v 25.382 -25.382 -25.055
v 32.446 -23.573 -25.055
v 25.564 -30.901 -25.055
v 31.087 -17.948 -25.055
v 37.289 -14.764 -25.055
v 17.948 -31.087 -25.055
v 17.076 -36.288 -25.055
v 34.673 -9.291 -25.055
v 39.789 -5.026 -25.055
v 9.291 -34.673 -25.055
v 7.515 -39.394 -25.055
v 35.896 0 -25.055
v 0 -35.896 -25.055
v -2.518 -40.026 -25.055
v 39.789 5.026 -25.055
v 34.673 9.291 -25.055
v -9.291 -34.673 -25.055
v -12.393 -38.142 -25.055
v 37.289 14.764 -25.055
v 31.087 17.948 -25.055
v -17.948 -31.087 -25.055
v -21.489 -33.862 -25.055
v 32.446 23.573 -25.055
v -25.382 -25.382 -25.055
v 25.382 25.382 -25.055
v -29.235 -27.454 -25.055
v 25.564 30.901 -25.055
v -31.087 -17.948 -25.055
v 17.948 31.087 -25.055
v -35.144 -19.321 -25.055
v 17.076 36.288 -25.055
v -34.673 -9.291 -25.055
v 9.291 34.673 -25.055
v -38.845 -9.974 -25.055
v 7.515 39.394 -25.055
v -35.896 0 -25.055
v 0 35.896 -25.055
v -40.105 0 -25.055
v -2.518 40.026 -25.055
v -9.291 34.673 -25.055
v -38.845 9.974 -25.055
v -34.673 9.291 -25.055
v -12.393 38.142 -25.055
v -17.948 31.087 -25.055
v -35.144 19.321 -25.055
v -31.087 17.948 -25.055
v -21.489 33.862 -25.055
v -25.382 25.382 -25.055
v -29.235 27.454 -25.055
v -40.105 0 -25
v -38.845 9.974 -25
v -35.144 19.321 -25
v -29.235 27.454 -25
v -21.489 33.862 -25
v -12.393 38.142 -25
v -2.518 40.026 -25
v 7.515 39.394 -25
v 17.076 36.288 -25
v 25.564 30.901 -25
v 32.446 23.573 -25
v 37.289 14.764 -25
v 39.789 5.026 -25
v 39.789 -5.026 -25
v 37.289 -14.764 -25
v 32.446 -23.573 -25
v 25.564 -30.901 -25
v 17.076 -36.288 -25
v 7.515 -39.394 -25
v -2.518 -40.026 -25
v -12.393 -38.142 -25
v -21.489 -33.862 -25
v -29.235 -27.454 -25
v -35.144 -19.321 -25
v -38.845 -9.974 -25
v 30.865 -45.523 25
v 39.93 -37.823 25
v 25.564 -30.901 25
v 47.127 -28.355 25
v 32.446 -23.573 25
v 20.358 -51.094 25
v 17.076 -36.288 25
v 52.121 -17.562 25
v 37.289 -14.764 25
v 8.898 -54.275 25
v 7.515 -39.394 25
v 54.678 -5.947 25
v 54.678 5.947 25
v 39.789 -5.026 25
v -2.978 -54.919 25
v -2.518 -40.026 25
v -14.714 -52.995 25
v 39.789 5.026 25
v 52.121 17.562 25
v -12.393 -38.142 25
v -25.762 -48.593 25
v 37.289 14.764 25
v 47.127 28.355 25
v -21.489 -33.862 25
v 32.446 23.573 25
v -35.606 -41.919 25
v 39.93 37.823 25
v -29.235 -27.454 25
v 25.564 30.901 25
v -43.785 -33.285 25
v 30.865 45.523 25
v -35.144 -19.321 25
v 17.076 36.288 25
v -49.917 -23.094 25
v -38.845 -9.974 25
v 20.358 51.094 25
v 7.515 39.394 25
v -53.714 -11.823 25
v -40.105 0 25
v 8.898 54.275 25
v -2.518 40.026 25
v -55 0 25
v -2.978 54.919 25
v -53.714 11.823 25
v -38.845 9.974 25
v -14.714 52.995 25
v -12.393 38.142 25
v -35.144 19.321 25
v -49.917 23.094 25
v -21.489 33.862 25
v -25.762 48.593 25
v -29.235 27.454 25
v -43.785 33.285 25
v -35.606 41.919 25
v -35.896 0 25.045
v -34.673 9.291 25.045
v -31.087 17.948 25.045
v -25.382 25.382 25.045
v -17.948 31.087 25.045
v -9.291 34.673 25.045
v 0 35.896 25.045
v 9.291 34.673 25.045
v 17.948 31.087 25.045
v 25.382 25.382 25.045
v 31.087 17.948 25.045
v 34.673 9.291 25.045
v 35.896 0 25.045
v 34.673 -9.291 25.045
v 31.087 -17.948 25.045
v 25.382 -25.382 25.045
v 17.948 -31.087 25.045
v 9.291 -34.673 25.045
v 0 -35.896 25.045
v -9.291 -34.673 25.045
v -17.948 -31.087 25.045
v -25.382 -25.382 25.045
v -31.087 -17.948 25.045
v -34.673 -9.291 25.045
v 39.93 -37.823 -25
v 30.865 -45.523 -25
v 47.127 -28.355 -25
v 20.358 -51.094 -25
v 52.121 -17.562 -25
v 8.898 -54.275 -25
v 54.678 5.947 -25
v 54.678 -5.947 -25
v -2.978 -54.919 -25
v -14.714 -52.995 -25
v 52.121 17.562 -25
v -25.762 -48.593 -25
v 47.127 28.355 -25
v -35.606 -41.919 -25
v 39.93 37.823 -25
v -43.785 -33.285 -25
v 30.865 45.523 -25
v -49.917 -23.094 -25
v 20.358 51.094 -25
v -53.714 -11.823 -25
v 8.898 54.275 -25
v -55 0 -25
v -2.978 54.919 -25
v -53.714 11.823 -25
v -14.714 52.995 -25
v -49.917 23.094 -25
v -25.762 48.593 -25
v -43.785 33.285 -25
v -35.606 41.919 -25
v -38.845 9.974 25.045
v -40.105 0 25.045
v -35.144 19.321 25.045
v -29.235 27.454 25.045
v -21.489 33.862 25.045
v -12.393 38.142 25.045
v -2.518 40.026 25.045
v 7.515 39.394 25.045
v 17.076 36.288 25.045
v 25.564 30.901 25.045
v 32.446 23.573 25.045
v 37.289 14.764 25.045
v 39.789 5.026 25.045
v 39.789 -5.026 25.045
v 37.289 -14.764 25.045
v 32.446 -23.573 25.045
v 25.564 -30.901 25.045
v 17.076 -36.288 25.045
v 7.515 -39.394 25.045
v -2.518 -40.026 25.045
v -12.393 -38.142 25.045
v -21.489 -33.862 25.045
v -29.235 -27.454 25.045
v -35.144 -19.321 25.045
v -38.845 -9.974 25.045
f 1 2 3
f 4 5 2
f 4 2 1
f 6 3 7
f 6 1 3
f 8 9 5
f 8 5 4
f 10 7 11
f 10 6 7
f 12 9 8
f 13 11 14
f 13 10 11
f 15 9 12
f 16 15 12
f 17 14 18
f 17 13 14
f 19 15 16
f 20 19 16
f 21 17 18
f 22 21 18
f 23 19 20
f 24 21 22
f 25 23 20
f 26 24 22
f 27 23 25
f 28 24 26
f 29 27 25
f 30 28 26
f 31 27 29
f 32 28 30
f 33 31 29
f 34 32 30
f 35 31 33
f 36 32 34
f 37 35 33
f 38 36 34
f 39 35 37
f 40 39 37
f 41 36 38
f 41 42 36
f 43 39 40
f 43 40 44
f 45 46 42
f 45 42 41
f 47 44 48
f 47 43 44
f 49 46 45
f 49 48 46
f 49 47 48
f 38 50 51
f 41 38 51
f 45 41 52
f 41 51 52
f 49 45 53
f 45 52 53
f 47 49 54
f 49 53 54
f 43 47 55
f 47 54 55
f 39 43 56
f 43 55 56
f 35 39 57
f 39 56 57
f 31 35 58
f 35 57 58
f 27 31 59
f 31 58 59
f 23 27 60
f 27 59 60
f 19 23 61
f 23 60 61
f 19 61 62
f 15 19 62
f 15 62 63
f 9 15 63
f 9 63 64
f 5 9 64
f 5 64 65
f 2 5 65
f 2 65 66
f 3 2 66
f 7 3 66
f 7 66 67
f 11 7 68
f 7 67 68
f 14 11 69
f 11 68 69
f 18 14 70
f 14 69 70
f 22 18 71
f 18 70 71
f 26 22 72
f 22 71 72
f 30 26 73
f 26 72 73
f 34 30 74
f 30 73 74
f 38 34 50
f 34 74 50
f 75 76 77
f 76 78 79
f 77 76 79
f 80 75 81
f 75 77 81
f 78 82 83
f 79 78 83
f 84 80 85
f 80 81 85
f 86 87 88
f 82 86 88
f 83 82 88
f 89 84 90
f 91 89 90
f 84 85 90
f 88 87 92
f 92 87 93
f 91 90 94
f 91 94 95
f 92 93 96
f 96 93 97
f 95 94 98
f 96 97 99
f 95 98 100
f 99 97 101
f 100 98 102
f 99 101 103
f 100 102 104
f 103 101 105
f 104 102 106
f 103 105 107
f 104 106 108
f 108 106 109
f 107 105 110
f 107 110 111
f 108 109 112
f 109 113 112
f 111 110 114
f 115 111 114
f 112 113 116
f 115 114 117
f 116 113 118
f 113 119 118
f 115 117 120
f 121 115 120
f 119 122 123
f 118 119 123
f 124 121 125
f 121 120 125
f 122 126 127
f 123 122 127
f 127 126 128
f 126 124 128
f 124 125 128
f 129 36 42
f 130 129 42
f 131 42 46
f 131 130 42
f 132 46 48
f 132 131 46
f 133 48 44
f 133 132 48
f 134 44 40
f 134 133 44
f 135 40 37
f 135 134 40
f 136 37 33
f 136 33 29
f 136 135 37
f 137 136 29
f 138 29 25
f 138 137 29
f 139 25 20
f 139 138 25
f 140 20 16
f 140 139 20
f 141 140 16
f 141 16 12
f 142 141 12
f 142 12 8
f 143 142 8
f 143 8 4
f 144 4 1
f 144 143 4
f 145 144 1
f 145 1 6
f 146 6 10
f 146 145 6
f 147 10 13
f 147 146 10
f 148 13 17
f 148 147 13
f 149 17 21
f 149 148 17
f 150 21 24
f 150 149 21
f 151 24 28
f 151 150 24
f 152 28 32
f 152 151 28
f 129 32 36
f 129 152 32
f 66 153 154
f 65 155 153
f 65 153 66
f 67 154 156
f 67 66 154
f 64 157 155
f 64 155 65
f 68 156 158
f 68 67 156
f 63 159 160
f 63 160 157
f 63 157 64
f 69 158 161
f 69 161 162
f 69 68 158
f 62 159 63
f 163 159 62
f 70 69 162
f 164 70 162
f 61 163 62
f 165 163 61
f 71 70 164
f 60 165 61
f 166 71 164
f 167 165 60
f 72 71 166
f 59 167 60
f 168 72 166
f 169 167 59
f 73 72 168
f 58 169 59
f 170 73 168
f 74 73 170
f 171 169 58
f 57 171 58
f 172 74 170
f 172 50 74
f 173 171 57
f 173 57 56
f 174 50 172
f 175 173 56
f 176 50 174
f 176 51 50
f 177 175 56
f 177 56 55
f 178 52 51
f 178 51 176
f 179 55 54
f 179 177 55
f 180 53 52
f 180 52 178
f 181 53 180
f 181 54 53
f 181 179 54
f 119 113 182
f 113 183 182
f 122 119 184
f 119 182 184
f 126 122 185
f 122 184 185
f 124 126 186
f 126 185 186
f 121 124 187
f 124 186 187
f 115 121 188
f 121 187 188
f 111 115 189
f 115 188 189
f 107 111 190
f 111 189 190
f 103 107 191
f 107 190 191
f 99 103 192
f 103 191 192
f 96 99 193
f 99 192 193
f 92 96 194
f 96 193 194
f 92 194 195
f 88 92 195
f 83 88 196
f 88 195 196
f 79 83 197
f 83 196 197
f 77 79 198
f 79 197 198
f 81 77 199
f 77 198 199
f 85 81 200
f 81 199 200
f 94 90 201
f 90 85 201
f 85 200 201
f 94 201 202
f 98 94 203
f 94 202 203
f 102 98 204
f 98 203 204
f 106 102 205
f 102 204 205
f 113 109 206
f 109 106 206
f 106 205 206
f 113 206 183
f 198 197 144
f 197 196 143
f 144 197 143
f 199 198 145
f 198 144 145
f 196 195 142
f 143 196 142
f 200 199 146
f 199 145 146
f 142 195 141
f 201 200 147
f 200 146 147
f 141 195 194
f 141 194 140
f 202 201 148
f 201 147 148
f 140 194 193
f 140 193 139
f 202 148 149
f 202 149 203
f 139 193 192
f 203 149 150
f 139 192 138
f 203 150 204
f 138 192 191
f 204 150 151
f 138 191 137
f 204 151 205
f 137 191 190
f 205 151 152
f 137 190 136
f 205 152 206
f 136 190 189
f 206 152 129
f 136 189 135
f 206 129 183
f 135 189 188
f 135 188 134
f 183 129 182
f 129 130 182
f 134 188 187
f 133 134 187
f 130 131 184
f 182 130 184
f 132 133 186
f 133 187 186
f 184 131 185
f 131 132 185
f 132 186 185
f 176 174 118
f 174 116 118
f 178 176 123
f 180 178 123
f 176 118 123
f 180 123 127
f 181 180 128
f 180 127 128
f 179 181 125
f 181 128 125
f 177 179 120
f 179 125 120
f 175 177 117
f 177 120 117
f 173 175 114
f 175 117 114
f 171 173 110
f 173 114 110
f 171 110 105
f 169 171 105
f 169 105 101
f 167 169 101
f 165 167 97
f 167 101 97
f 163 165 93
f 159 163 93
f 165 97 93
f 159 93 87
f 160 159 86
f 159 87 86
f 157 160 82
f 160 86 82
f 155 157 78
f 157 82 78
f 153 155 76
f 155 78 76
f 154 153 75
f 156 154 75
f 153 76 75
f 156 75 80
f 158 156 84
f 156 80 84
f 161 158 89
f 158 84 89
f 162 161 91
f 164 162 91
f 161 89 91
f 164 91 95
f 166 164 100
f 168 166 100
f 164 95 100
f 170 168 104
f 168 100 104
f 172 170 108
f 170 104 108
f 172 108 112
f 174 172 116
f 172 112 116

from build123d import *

# Parameters (mm, degrees)
F0_W = 15
F0_H = 50
F1_W = 4.208725
F1_H = 50.100006


with BuildPart() as f2:
    # F0 (on Front) → F2 (revolve)
    with BuildSketch(Plane.XZ):
        with Locations((-47.5, 0)):
            Rectangle(F0_W, F0_H)
    revolve(axis=Axis((0, 0, 0), (0, 0, -1)))

    # F1 (on Front) → F3 (revolve)
    with BuildSketch(Plane.XZ):
        with Locations((-38.000499, -0.005182)):
            Rectangle(F1_W, F1_H)
    revolve(axis=Axis((0, 0, 0), (0, 0, -1)))


solid = f2.part
